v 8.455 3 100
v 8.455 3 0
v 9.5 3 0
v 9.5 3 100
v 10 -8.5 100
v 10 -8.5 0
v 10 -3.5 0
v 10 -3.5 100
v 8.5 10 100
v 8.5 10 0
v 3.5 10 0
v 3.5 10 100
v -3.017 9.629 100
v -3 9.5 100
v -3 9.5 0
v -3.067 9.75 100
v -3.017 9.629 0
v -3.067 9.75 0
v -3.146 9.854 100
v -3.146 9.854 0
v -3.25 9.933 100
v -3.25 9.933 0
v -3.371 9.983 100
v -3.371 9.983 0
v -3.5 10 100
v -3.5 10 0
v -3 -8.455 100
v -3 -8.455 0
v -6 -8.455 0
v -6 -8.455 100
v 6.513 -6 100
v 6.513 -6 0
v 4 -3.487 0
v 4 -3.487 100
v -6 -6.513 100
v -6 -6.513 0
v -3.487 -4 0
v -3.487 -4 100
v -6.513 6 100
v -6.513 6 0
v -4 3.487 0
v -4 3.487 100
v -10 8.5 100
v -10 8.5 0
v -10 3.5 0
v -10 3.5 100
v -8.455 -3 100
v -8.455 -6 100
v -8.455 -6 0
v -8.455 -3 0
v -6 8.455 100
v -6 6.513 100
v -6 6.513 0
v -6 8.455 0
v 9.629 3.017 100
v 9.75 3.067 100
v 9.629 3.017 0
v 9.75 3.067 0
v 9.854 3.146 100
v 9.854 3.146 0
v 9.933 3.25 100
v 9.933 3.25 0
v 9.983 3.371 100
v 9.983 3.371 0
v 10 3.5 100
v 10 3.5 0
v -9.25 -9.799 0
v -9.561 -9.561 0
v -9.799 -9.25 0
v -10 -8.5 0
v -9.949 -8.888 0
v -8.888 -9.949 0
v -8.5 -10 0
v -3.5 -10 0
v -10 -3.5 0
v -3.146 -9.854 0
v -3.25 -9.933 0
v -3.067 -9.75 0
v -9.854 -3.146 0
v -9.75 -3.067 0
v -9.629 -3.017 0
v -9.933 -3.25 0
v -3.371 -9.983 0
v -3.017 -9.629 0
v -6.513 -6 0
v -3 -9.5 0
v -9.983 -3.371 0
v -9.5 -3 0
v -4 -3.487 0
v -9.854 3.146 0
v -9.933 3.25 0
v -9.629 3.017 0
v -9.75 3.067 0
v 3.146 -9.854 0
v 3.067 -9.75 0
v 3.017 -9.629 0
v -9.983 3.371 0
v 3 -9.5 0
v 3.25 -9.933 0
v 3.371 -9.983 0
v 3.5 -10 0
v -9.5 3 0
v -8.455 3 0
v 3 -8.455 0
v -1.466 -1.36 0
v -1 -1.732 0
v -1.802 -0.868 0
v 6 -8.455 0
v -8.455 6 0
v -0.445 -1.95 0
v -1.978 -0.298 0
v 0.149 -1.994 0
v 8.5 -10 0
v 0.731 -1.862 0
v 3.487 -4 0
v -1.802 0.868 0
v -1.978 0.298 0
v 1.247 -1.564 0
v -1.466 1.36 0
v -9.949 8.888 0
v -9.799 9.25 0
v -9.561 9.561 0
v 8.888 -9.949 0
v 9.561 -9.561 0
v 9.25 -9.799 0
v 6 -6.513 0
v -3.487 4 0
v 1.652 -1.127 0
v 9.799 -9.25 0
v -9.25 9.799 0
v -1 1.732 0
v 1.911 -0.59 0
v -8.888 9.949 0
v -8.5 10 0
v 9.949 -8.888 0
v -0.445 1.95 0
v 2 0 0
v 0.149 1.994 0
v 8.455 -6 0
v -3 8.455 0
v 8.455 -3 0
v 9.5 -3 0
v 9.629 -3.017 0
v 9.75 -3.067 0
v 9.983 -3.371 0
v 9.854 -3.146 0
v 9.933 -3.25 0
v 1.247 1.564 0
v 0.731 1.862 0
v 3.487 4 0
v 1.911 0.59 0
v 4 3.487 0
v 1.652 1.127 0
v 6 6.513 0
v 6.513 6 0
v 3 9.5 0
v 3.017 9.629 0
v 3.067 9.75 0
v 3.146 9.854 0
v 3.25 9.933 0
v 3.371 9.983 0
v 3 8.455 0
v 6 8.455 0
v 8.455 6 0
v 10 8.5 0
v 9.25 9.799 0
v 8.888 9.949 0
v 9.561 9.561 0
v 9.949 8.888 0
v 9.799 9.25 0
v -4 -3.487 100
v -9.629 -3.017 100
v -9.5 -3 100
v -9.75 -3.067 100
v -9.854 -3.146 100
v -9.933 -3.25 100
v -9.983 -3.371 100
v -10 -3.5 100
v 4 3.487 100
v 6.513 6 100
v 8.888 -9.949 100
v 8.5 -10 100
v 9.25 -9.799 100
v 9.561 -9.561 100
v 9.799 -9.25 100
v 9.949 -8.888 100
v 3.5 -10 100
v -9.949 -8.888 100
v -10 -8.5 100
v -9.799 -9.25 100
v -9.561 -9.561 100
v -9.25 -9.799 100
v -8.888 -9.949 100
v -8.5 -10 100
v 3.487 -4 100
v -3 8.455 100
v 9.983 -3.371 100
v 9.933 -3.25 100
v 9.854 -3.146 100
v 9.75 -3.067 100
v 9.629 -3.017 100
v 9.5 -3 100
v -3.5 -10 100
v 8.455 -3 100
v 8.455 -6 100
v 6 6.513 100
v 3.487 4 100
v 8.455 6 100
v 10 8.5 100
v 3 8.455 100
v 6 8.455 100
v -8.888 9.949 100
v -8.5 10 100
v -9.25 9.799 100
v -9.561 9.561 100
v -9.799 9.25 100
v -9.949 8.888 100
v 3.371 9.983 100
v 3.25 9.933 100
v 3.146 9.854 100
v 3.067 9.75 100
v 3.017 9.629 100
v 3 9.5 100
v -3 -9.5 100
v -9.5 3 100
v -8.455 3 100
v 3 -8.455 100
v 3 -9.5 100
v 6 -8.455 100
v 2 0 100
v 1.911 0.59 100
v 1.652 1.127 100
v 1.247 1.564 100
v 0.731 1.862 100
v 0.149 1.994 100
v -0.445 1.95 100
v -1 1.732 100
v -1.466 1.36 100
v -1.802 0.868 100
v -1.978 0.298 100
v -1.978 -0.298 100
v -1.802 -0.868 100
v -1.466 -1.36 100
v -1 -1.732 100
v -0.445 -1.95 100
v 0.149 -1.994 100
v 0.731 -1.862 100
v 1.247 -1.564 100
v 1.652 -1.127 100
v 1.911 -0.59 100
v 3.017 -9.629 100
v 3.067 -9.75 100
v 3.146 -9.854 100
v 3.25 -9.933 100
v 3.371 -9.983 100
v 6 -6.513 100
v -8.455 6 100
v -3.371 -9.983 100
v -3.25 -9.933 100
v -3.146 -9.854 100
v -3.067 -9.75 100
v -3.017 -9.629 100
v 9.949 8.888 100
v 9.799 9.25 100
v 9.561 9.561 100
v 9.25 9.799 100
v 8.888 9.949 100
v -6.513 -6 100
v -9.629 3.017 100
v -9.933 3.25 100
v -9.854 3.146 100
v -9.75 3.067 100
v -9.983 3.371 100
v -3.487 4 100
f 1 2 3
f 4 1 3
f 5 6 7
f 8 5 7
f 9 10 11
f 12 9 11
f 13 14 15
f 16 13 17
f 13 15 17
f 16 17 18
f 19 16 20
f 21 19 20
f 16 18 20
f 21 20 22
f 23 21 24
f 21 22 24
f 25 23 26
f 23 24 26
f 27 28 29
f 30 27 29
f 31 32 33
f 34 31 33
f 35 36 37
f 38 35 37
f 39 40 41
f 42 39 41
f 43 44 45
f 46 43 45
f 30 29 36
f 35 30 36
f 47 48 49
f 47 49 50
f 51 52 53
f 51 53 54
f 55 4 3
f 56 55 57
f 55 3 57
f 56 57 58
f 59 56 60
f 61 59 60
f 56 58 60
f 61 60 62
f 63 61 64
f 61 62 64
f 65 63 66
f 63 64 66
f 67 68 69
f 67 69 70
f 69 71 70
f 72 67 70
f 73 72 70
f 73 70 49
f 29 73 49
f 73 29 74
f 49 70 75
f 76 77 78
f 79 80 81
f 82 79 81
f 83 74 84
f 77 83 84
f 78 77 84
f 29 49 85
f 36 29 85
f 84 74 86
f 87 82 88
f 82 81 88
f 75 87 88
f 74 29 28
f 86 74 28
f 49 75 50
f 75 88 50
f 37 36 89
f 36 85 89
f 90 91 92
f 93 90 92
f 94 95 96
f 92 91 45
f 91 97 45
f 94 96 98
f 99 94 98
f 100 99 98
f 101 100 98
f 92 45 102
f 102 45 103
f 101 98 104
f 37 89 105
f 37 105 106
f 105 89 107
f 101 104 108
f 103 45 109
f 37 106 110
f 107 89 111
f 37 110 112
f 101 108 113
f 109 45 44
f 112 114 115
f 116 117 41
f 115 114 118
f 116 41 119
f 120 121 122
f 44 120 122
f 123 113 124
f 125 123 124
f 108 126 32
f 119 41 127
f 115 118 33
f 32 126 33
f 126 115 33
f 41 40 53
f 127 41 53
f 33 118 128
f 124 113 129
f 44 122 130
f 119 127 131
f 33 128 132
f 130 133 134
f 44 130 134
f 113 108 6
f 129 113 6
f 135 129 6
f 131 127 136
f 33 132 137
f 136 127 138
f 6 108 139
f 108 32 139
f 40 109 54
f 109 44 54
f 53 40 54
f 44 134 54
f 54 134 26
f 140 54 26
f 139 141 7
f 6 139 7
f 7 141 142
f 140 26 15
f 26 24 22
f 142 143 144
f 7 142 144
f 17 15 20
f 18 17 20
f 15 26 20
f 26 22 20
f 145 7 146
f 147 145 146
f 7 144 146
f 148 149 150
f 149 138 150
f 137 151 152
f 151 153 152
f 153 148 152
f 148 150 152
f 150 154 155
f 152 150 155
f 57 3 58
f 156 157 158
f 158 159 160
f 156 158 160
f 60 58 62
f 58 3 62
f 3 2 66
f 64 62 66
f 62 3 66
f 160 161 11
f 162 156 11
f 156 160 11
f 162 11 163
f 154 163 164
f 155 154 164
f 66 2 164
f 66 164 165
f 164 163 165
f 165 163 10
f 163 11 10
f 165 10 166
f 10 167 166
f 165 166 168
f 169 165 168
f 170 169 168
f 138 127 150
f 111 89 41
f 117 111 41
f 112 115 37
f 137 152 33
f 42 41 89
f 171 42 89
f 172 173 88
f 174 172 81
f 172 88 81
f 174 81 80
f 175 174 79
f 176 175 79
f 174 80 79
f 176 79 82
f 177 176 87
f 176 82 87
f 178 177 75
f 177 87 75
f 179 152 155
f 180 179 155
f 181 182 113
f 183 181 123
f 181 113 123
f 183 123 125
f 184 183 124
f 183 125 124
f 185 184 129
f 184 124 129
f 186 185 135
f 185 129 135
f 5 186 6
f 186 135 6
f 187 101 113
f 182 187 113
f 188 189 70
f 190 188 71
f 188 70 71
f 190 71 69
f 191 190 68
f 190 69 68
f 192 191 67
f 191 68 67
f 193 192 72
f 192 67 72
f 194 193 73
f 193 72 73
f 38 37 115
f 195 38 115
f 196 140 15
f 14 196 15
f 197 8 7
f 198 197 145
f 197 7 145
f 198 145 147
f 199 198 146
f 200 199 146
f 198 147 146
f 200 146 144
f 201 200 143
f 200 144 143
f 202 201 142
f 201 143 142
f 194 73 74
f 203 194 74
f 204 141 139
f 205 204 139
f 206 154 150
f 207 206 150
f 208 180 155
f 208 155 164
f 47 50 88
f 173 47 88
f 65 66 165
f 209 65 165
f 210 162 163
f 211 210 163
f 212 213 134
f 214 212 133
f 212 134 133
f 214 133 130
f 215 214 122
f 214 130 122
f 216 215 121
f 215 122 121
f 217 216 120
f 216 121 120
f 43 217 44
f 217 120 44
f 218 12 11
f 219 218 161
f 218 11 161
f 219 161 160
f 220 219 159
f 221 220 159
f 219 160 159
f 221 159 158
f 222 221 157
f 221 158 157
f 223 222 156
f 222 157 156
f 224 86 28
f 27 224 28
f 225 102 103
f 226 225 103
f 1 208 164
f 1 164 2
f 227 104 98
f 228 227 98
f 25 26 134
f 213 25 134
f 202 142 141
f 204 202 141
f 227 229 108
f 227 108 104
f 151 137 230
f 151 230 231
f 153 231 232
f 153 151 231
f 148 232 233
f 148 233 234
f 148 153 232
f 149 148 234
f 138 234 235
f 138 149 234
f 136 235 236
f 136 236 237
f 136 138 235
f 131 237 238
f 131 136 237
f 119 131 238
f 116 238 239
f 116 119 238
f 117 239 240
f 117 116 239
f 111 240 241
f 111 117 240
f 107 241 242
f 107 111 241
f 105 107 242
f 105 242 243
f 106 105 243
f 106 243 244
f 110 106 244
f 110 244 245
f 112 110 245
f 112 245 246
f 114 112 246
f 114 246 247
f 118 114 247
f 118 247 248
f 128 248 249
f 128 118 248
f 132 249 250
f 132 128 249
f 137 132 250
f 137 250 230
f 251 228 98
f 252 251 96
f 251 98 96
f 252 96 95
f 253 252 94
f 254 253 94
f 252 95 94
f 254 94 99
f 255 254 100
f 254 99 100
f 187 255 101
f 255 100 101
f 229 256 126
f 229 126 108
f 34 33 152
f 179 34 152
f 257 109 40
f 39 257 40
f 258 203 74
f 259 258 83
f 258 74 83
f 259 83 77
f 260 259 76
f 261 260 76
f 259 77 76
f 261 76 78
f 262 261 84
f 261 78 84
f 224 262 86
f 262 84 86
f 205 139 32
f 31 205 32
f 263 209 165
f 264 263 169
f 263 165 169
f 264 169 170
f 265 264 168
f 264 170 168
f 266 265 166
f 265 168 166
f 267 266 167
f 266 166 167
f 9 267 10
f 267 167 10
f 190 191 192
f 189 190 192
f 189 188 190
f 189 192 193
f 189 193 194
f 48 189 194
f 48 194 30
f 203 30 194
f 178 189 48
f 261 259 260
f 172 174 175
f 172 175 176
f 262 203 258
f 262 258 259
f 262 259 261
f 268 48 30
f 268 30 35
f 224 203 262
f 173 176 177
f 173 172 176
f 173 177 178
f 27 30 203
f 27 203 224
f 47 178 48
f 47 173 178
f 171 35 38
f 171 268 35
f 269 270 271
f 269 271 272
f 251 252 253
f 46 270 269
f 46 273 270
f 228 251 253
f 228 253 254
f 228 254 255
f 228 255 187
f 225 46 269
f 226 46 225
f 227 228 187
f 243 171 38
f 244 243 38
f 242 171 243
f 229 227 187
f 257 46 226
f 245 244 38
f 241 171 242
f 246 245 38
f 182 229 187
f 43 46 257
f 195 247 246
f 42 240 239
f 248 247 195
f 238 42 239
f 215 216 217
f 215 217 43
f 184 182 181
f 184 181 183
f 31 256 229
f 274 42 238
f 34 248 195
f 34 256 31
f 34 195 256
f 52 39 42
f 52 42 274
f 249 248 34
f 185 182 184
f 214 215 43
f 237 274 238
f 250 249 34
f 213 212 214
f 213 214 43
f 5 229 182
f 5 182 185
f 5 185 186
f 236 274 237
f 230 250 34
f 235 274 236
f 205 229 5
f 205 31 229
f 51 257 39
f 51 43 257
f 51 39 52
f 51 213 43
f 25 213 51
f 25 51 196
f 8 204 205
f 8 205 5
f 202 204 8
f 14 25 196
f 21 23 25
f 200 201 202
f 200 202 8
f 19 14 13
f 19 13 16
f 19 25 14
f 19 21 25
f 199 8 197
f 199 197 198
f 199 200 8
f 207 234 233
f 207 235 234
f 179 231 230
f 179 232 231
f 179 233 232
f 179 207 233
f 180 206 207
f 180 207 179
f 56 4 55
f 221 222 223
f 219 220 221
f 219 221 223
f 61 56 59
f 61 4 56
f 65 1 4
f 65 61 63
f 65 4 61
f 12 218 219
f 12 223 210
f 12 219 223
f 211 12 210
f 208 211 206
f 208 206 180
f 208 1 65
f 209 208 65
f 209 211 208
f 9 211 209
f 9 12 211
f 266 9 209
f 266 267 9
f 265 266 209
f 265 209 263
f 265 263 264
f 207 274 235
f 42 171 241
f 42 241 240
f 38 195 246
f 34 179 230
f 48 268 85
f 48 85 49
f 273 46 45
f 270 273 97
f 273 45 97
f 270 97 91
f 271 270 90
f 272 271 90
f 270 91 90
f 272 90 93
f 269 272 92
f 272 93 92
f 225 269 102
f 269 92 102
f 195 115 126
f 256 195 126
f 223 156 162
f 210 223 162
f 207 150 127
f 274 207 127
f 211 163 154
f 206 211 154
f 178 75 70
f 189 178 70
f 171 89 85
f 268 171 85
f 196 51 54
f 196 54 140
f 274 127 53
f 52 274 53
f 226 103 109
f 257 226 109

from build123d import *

# Parameters (mm, degrees)
F0_R     = 2
F1_DEPTH = 100


with BuildPart() as f1:
    # F0 (on Top) → F1 (new body)
    with BuildSketch(Plane.XY):
        with BuildLine():
            Line((8.455436, 3), (9.5, 3))
            ThreePointArc((9.5, 3), (9.853553, 3.146447), (10, 3.5))
            Line((10, 3.5), (10, 8.5))
            ThreePointArc((10, 8.5), (9.56066, 9.56066), (8.5, 10))
            Line((8.5, 10), (3.5, 10))
            ThreePointArc((3.5, 10), (3.146447, 9.853553), (3, 9.5))
            Line((3, 9.5), (3, 8.455436))
            Line((3, 8.455436), (6, 8.455436))
            Line((6, 8.455436), (6, 6.512804))
            Line((6, 6.512804), (3.487196, 4))
            Line((3.487196, 4), (0, 4))
            Line((0, 4), (-3.487196, 4))
            Line((-3.487196, 4), (-6, 6.512804))
            Line((-6, 6.512804), (-6, 8.455436))
            Line((-6, 8.455436), (-3, 8.455436))
            Line((-3, 8.455436), (-3, 9.5))
            ThreePointArc((-3, 9.5), (-3.146447, 9.853553), (-3.5, 10))
            Line((-3.5, 10), (-8.5, 10))
            ThreePointArc((-8.5, 10), (-9.56066, 9.56066), (-10, 8.5))
            Line((-10, 8.5), (-10, 3.5))
            ThreePointArc((-10, 3.5), (-9.853553, 3.146447), (-9.5, 3))
            Line((-9.5, 3), (-8.455436, 3))
            Line((-8.455436, 3), (-8.455436, 6))
            Line((-8.455436, 6), (-6.512804, 6))
            Line((-6.512804, 6), (-4, 3.487196))
            Line((-4, 3.487196), (-4, 0))
            Line((-4, 0), (-4, -3.487196))
            Line((-4, -3.487196), (-6.512804, -6))
            Line((-6.512804, -6), (-8.455436, -6))
            Line((-8.455436, -6), (-8.455436, -3))
            Line((-8.455436, -3), (-9.5, -3))
            ThreePointArc((-9.5, -3), (-9.853553, -3.146447), (-10, -3.5))
            Line((-10, -3.5), (-10, -8.5))
            ThreePointArc((-10, -8.5), (-9.56066, -9.56066), (-8.5, -10))
            Line((-8.5, -10), (-3.5, -10))
            ThreePointArc((-3.5, -10), (-3.146447, -9.853553), (-3, -9.5))
            Line((-3, -9.5), (-3, -8.455436))
            Line((-3, -8.455436), (-6, -8.455436))
            Line((-6, -8.455436), (-6, -6.512804))
            Line((-6, -6.512804), (-3.487196, -4))
            Line((-3.487196, -4), (0, -4))
            Line((0, -4), (3.487196, -4))
            Line((3.487196, -4), (6, -6.512804))
            Line((6, -6.512804), (6, -8.455436))
            Line((6, -8.455436), (3, -8.455436))
            Line((3, -8.455436), (3, -9.5))
            ThreePointArc((3, -9.5), (3.146447, -9.853553), (3.5, -10))
            Line((3.5, -10), (8.5, -10))
            ThreePointArc((8.5, -10), (9.56066, -9.56066), (10, -8.5))
            Line((10, -8.5), (10, -3.5))
            ThreePointArc((10, -3.5), (9.853553, -3.146447), (9.5, -3))
            Line((9.5, -3), (8.455436, -3))
            Line((8.455436, -3), (8.455436, -6))
            Line((8.455436, -6), (6.512804, -6))
            Line((6.512804, -6), (4, -3.487196))
            Line((4, -3.487196), (4, 0))
            Line((4, 0), (4, 3.487196))
            Line((4, 3.487196), (6.512804, 6))
            Line((6.512804, 6), (8.455436, 6))
            Line((8.455436, 6), (8.455436, 3))
        make_face()
        Circle(F0_R, mode=Mode.SUBTRACT)
    extrude(amount=F1_DEPTH)


solid = f1.part
